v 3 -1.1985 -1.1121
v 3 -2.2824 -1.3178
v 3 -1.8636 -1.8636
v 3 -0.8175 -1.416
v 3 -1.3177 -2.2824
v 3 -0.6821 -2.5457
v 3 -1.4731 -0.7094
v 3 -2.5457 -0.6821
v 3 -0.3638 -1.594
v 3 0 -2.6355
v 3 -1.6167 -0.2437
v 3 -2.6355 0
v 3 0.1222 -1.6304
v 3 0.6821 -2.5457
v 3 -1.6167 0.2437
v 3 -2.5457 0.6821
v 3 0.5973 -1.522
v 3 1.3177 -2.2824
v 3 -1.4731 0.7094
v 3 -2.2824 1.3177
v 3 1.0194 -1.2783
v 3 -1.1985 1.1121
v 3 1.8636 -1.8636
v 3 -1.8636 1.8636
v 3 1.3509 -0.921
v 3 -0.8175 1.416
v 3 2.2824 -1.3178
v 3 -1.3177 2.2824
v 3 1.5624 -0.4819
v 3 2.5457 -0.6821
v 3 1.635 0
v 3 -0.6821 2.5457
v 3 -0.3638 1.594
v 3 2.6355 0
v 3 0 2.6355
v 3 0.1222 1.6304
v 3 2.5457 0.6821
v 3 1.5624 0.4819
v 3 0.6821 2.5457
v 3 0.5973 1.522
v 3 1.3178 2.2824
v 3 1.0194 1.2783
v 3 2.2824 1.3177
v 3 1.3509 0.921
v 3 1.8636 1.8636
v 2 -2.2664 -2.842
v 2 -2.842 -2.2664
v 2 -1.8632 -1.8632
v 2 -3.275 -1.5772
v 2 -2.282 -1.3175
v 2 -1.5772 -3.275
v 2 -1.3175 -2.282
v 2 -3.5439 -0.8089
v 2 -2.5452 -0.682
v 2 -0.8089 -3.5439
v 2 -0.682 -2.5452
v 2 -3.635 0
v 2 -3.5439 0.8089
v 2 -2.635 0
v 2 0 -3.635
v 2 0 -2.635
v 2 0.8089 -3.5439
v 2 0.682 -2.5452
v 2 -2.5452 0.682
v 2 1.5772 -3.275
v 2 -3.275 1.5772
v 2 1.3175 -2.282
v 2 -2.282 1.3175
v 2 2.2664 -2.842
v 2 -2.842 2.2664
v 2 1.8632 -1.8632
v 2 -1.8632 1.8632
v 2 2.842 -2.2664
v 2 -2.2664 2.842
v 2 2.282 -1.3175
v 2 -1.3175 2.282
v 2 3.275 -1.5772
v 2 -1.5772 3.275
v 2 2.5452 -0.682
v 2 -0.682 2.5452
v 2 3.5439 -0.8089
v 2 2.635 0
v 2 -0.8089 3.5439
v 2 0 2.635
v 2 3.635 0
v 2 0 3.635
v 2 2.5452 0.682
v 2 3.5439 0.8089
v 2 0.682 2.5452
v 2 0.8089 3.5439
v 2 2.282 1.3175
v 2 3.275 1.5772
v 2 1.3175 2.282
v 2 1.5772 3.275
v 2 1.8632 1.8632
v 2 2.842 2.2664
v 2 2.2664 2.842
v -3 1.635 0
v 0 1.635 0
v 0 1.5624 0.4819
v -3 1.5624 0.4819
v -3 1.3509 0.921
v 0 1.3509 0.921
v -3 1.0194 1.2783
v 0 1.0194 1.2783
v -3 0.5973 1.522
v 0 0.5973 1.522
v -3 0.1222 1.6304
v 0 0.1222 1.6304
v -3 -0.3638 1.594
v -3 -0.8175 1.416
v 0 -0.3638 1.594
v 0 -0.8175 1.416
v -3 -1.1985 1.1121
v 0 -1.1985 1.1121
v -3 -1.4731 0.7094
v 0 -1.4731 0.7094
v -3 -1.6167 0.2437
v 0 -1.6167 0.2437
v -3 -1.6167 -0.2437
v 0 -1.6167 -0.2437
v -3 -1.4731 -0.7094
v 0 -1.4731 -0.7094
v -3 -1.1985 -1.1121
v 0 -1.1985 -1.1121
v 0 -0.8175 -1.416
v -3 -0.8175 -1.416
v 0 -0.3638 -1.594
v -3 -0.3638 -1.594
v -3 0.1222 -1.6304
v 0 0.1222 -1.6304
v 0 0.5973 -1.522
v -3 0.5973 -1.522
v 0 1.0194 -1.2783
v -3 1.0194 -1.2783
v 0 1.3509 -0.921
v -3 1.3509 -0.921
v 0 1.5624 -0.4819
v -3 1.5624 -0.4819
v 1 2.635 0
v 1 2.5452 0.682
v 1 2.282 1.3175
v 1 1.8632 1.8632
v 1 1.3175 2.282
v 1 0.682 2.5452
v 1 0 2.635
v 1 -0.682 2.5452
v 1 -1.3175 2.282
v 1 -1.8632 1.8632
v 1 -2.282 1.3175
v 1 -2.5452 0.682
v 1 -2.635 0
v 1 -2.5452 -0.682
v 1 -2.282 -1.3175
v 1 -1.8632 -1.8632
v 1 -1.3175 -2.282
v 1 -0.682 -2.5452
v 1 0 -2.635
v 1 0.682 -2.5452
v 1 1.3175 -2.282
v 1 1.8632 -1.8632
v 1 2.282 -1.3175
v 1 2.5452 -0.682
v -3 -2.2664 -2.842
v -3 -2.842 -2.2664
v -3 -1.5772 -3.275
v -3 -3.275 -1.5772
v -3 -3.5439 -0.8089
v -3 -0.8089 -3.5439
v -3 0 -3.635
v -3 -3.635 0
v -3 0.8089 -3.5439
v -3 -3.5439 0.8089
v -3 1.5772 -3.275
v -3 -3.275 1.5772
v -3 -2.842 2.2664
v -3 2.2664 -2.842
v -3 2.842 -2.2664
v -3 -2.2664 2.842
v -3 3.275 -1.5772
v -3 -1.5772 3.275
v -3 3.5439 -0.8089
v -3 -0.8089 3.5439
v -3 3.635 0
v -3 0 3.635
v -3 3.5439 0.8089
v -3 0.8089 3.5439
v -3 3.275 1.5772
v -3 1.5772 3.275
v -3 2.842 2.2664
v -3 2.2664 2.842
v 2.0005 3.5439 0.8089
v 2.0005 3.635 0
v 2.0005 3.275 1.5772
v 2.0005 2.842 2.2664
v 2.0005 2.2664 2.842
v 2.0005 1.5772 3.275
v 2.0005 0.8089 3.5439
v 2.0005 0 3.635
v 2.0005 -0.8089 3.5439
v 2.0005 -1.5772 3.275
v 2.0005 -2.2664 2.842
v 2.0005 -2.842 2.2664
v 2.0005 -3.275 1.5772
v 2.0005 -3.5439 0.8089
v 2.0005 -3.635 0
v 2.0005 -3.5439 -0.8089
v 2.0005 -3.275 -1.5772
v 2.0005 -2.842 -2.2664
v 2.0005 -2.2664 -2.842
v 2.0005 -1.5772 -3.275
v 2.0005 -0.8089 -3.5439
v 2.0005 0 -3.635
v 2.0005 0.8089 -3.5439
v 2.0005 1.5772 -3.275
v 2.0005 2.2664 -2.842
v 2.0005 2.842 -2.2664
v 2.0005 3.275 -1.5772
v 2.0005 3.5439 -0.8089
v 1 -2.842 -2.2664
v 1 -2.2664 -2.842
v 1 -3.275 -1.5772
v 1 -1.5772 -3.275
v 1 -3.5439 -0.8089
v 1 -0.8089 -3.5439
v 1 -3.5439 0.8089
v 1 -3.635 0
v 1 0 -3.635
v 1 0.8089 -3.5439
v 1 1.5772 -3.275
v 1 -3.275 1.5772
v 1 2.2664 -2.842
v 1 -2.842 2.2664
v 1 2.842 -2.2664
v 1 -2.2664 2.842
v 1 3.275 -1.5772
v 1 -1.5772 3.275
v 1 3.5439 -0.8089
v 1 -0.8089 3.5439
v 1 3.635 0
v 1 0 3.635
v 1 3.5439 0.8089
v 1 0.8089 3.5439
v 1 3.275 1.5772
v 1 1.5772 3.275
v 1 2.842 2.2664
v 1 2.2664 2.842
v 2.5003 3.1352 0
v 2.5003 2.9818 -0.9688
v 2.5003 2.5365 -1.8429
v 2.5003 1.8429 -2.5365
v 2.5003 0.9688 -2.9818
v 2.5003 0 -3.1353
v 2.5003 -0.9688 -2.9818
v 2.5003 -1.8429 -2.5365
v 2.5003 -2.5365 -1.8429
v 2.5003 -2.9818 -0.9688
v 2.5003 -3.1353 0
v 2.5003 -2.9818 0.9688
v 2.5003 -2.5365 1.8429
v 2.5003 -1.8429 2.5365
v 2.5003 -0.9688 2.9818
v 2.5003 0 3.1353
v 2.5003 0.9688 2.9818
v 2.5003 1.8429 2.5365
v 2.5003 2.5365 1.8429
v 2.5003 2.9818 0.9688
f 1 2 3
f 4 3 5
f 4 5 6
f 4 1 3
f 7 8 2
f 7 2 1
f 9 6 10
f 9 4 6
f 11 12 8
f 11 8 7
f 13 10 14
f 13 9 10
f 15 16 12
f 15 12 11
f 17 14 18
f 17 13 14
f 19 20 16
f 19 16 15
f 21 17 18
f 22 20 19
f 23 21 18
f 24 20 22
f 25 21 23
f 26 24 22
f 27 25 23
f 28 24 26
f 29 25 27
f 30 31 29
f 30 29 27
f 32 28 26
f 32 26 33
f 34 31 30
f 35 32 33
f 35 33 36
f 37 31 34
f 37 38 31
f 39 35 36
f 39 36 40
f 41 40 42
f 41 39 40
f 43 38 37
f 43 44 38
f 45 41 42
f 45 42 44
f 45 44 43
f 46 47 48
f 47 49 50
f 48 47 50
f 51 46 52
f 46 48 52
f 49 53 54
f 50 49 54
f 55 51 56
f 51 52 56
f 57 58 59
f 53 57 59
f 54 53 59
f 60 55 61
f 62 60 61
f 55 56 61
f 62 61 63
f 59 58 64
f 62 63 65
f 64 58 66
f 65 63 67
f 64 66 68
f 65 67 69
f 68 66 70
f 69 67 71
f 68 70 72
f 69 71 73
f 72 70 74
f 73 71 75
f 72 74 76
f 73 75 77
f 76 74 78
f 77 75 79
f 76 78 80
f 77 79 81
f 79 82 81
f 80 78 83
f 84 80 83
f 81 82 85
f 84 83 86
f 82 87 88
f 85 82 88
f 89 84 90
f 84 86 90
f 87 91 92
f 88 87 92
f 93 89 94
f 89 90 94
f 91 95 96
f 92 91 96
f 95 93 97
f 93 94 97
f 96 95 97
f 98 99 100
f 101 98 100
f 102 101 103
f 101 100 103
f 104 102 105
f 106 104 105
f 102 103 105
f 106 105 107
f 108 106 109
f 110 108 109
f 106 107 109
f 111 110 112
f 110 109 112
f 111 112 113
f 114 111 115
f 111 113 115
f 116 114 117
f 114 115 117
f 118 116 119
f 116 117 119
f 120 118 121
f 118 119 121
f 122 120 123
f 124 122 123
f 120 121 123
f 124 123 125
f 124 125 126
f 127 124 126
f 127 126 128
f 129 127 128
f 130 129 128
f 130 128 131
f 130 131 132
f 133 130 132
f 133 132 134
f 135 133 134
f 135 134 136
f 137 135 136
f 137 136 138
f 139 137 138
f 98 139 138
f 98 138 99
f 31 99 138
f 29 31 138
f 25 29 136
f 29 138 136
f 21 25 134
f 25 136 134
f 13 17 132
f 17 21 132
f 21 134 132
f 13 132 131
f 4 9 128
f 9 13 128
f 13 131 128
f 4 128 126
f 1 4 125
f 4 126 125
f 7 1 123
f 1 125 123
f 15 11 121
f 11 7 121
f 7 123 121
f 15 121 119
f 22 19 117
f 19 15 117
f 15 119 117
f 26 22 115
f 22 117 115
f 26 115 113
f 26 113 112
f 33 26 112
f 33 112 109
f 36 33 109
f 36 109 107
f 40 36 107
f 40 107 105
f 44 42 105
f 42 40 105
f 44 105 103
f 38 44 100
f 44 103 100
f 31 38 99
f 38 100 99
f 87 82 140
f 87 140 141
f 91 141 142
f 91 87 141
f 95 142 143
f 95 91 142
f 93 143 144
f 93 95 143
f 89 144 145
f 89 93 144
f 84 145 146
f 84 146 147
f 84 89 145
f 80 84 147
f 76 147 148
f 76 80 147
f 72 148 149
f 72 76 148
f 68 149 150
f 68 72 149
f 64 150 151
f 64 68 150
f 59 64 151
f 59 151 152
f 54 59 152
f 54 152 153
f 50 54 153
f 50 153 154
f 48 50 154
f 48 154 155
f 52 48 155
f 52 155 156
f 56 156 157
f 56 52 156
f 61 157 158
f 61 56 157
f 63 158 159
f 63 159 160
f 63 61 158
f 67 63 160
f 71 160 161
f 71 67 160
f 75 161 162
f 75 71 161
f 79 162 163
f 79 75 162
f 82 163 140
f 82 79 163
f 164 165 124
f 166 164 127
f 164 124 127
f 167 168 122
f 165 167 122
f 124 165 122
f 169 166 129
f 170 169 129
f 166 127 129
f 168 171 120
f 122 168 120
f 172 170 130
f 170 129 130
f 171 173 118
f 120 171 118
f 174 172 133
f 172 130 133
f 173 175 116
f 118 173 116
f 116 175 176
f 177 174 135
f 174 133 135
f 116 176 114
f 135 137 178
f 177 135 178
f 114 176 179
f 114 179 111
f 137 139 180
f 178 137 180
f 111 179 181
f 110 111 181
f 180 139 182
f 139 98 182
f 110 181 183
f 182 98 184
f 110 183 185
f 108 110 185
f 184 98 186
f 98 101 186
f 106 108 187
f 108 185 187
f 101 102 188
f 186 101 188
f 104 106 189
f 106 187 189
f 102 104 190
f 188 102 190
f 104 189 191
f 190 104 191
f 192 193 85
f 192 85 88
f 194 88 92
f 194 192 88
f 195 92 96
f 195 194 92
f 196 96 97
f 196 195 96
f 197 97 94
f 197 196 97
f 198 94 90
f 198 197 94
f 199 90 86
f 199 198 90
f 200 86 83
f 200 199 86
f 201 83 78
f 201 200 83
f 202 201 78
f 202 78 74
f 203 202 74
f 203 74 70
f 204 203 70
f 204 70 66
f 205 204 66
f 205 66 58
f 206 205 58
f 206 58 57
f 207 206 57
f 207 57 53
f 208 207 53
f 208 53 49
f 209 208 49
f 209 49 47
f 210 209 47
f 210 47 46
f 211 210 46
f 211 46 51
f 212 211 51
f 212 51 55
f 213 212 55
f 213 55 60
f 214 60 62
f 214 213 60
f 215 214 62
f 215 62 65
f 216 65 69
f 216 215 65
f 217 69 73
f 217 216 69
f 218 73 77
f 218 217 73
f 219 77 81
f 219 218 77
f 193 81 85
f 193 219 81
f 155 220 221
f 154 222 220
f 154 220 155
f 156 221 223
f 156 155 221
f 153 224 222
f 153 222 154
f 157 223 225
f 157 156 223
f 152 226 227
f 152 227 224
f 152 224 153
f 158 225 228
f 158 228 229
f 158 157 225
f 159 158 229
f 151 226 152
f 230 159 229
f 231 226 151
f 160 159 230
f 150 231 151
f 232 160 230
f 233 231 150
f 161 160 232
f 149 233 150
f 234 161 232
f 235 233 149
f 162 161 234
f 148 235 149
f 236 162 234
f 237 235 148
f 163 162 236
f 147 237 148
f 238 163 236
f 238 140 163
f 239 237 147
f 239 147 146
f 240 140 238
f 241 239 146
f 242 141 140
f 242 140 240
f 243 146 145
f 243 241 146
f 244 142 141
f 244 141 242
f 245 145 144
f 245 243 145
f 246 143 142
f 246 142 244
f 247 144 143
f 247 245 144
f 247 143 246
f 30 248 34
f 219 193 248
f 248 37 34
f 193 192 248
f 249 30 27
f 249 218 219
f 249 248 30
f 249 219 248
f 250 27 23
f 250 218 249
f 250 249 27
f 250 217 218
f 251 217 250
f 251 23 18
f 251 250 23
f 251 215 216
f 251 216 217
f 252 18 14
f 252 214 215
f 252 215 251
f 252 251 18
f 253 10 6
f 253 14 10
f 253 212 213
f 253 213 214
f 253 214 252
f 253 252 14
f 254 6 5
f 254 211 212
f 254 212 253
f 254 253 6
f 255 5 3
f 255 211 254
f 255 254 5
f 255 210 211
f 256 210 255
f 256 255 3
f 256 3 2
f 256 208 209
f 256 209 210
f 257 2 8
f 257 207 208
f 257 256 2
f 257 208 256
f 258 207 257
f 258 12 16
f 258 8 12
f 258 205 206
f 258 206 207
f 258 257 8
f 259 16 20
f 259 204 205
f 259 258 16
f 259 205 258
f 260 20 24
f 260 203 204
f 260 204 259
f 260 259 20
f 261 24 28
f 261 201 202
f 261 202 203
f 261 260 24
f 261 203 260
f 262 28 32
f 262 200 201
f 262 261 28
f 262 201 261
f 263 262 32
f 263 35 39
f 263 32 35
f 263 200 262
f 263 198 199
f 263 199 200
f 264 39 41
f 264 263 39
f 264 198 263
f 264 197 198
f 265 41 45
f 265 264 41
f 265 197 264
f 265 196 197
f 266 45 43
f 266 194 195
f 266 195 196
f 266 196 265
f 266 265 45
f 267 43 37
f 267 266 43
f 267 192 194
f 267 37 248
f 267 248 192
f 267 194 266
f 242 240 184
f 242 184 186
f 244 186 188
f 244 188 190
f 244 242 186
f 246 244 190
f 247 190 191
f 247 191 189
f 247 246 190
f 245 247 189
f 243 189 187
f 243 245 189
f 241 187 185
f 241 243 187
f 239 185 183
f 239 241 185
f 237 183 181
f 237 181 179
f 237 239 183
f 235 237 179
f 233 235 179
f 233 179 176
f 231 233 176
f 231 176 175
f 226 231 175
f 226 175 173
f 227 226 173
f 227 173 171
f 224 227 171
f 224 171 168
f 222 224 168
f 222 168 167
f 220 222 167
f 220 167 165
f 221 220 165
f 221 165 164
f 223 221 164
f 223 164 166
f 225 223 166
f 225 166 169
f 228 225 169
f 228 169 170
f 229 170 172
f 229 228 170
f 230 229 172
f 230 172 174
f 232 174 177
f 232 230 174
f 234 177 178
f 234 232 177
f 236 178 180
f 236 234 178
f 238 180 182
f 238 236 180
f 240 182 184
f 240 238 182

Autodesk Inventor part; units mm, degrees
ref_plane "YZ Plane" through (0, 0, 0) normal (1, 0, 0) x (0, 1, 0)
ref_plane "XZ Plane" through (0, 0, 0) normal (0, 1, 0) x (-1, 0, 0)
sketch "スケッチ1" plane through (0, 0, 0) normal (1, 0, 0) x (0, 1, 0)
  circle A0 centre (0, 0) radius 3.635
  circle A1 centre (0, 0) radius 1.635
  circle A2 centre (0, 0) radius 2.635
  dimension "d0" = 3.27
  dimension "d1" = 2
  dimension "d7" = 1
extrude "押し出し1" add sketch "スケッチ1" along normal mid plane 6 contours A0 | A2
ref_plane "作業平面1" through (2, 0, 0) normal (1, 0, 0) x (0, 0, -1)
extrude "押し出し3" cut sketch "スケッチ1" against normal blind 1 from surface at 2 contours A0
chamfer "面取り3" distance 1 angle 45 1 edges at (3, -3.635, 0)
properties part number "spacer_Φ3.2_1"
